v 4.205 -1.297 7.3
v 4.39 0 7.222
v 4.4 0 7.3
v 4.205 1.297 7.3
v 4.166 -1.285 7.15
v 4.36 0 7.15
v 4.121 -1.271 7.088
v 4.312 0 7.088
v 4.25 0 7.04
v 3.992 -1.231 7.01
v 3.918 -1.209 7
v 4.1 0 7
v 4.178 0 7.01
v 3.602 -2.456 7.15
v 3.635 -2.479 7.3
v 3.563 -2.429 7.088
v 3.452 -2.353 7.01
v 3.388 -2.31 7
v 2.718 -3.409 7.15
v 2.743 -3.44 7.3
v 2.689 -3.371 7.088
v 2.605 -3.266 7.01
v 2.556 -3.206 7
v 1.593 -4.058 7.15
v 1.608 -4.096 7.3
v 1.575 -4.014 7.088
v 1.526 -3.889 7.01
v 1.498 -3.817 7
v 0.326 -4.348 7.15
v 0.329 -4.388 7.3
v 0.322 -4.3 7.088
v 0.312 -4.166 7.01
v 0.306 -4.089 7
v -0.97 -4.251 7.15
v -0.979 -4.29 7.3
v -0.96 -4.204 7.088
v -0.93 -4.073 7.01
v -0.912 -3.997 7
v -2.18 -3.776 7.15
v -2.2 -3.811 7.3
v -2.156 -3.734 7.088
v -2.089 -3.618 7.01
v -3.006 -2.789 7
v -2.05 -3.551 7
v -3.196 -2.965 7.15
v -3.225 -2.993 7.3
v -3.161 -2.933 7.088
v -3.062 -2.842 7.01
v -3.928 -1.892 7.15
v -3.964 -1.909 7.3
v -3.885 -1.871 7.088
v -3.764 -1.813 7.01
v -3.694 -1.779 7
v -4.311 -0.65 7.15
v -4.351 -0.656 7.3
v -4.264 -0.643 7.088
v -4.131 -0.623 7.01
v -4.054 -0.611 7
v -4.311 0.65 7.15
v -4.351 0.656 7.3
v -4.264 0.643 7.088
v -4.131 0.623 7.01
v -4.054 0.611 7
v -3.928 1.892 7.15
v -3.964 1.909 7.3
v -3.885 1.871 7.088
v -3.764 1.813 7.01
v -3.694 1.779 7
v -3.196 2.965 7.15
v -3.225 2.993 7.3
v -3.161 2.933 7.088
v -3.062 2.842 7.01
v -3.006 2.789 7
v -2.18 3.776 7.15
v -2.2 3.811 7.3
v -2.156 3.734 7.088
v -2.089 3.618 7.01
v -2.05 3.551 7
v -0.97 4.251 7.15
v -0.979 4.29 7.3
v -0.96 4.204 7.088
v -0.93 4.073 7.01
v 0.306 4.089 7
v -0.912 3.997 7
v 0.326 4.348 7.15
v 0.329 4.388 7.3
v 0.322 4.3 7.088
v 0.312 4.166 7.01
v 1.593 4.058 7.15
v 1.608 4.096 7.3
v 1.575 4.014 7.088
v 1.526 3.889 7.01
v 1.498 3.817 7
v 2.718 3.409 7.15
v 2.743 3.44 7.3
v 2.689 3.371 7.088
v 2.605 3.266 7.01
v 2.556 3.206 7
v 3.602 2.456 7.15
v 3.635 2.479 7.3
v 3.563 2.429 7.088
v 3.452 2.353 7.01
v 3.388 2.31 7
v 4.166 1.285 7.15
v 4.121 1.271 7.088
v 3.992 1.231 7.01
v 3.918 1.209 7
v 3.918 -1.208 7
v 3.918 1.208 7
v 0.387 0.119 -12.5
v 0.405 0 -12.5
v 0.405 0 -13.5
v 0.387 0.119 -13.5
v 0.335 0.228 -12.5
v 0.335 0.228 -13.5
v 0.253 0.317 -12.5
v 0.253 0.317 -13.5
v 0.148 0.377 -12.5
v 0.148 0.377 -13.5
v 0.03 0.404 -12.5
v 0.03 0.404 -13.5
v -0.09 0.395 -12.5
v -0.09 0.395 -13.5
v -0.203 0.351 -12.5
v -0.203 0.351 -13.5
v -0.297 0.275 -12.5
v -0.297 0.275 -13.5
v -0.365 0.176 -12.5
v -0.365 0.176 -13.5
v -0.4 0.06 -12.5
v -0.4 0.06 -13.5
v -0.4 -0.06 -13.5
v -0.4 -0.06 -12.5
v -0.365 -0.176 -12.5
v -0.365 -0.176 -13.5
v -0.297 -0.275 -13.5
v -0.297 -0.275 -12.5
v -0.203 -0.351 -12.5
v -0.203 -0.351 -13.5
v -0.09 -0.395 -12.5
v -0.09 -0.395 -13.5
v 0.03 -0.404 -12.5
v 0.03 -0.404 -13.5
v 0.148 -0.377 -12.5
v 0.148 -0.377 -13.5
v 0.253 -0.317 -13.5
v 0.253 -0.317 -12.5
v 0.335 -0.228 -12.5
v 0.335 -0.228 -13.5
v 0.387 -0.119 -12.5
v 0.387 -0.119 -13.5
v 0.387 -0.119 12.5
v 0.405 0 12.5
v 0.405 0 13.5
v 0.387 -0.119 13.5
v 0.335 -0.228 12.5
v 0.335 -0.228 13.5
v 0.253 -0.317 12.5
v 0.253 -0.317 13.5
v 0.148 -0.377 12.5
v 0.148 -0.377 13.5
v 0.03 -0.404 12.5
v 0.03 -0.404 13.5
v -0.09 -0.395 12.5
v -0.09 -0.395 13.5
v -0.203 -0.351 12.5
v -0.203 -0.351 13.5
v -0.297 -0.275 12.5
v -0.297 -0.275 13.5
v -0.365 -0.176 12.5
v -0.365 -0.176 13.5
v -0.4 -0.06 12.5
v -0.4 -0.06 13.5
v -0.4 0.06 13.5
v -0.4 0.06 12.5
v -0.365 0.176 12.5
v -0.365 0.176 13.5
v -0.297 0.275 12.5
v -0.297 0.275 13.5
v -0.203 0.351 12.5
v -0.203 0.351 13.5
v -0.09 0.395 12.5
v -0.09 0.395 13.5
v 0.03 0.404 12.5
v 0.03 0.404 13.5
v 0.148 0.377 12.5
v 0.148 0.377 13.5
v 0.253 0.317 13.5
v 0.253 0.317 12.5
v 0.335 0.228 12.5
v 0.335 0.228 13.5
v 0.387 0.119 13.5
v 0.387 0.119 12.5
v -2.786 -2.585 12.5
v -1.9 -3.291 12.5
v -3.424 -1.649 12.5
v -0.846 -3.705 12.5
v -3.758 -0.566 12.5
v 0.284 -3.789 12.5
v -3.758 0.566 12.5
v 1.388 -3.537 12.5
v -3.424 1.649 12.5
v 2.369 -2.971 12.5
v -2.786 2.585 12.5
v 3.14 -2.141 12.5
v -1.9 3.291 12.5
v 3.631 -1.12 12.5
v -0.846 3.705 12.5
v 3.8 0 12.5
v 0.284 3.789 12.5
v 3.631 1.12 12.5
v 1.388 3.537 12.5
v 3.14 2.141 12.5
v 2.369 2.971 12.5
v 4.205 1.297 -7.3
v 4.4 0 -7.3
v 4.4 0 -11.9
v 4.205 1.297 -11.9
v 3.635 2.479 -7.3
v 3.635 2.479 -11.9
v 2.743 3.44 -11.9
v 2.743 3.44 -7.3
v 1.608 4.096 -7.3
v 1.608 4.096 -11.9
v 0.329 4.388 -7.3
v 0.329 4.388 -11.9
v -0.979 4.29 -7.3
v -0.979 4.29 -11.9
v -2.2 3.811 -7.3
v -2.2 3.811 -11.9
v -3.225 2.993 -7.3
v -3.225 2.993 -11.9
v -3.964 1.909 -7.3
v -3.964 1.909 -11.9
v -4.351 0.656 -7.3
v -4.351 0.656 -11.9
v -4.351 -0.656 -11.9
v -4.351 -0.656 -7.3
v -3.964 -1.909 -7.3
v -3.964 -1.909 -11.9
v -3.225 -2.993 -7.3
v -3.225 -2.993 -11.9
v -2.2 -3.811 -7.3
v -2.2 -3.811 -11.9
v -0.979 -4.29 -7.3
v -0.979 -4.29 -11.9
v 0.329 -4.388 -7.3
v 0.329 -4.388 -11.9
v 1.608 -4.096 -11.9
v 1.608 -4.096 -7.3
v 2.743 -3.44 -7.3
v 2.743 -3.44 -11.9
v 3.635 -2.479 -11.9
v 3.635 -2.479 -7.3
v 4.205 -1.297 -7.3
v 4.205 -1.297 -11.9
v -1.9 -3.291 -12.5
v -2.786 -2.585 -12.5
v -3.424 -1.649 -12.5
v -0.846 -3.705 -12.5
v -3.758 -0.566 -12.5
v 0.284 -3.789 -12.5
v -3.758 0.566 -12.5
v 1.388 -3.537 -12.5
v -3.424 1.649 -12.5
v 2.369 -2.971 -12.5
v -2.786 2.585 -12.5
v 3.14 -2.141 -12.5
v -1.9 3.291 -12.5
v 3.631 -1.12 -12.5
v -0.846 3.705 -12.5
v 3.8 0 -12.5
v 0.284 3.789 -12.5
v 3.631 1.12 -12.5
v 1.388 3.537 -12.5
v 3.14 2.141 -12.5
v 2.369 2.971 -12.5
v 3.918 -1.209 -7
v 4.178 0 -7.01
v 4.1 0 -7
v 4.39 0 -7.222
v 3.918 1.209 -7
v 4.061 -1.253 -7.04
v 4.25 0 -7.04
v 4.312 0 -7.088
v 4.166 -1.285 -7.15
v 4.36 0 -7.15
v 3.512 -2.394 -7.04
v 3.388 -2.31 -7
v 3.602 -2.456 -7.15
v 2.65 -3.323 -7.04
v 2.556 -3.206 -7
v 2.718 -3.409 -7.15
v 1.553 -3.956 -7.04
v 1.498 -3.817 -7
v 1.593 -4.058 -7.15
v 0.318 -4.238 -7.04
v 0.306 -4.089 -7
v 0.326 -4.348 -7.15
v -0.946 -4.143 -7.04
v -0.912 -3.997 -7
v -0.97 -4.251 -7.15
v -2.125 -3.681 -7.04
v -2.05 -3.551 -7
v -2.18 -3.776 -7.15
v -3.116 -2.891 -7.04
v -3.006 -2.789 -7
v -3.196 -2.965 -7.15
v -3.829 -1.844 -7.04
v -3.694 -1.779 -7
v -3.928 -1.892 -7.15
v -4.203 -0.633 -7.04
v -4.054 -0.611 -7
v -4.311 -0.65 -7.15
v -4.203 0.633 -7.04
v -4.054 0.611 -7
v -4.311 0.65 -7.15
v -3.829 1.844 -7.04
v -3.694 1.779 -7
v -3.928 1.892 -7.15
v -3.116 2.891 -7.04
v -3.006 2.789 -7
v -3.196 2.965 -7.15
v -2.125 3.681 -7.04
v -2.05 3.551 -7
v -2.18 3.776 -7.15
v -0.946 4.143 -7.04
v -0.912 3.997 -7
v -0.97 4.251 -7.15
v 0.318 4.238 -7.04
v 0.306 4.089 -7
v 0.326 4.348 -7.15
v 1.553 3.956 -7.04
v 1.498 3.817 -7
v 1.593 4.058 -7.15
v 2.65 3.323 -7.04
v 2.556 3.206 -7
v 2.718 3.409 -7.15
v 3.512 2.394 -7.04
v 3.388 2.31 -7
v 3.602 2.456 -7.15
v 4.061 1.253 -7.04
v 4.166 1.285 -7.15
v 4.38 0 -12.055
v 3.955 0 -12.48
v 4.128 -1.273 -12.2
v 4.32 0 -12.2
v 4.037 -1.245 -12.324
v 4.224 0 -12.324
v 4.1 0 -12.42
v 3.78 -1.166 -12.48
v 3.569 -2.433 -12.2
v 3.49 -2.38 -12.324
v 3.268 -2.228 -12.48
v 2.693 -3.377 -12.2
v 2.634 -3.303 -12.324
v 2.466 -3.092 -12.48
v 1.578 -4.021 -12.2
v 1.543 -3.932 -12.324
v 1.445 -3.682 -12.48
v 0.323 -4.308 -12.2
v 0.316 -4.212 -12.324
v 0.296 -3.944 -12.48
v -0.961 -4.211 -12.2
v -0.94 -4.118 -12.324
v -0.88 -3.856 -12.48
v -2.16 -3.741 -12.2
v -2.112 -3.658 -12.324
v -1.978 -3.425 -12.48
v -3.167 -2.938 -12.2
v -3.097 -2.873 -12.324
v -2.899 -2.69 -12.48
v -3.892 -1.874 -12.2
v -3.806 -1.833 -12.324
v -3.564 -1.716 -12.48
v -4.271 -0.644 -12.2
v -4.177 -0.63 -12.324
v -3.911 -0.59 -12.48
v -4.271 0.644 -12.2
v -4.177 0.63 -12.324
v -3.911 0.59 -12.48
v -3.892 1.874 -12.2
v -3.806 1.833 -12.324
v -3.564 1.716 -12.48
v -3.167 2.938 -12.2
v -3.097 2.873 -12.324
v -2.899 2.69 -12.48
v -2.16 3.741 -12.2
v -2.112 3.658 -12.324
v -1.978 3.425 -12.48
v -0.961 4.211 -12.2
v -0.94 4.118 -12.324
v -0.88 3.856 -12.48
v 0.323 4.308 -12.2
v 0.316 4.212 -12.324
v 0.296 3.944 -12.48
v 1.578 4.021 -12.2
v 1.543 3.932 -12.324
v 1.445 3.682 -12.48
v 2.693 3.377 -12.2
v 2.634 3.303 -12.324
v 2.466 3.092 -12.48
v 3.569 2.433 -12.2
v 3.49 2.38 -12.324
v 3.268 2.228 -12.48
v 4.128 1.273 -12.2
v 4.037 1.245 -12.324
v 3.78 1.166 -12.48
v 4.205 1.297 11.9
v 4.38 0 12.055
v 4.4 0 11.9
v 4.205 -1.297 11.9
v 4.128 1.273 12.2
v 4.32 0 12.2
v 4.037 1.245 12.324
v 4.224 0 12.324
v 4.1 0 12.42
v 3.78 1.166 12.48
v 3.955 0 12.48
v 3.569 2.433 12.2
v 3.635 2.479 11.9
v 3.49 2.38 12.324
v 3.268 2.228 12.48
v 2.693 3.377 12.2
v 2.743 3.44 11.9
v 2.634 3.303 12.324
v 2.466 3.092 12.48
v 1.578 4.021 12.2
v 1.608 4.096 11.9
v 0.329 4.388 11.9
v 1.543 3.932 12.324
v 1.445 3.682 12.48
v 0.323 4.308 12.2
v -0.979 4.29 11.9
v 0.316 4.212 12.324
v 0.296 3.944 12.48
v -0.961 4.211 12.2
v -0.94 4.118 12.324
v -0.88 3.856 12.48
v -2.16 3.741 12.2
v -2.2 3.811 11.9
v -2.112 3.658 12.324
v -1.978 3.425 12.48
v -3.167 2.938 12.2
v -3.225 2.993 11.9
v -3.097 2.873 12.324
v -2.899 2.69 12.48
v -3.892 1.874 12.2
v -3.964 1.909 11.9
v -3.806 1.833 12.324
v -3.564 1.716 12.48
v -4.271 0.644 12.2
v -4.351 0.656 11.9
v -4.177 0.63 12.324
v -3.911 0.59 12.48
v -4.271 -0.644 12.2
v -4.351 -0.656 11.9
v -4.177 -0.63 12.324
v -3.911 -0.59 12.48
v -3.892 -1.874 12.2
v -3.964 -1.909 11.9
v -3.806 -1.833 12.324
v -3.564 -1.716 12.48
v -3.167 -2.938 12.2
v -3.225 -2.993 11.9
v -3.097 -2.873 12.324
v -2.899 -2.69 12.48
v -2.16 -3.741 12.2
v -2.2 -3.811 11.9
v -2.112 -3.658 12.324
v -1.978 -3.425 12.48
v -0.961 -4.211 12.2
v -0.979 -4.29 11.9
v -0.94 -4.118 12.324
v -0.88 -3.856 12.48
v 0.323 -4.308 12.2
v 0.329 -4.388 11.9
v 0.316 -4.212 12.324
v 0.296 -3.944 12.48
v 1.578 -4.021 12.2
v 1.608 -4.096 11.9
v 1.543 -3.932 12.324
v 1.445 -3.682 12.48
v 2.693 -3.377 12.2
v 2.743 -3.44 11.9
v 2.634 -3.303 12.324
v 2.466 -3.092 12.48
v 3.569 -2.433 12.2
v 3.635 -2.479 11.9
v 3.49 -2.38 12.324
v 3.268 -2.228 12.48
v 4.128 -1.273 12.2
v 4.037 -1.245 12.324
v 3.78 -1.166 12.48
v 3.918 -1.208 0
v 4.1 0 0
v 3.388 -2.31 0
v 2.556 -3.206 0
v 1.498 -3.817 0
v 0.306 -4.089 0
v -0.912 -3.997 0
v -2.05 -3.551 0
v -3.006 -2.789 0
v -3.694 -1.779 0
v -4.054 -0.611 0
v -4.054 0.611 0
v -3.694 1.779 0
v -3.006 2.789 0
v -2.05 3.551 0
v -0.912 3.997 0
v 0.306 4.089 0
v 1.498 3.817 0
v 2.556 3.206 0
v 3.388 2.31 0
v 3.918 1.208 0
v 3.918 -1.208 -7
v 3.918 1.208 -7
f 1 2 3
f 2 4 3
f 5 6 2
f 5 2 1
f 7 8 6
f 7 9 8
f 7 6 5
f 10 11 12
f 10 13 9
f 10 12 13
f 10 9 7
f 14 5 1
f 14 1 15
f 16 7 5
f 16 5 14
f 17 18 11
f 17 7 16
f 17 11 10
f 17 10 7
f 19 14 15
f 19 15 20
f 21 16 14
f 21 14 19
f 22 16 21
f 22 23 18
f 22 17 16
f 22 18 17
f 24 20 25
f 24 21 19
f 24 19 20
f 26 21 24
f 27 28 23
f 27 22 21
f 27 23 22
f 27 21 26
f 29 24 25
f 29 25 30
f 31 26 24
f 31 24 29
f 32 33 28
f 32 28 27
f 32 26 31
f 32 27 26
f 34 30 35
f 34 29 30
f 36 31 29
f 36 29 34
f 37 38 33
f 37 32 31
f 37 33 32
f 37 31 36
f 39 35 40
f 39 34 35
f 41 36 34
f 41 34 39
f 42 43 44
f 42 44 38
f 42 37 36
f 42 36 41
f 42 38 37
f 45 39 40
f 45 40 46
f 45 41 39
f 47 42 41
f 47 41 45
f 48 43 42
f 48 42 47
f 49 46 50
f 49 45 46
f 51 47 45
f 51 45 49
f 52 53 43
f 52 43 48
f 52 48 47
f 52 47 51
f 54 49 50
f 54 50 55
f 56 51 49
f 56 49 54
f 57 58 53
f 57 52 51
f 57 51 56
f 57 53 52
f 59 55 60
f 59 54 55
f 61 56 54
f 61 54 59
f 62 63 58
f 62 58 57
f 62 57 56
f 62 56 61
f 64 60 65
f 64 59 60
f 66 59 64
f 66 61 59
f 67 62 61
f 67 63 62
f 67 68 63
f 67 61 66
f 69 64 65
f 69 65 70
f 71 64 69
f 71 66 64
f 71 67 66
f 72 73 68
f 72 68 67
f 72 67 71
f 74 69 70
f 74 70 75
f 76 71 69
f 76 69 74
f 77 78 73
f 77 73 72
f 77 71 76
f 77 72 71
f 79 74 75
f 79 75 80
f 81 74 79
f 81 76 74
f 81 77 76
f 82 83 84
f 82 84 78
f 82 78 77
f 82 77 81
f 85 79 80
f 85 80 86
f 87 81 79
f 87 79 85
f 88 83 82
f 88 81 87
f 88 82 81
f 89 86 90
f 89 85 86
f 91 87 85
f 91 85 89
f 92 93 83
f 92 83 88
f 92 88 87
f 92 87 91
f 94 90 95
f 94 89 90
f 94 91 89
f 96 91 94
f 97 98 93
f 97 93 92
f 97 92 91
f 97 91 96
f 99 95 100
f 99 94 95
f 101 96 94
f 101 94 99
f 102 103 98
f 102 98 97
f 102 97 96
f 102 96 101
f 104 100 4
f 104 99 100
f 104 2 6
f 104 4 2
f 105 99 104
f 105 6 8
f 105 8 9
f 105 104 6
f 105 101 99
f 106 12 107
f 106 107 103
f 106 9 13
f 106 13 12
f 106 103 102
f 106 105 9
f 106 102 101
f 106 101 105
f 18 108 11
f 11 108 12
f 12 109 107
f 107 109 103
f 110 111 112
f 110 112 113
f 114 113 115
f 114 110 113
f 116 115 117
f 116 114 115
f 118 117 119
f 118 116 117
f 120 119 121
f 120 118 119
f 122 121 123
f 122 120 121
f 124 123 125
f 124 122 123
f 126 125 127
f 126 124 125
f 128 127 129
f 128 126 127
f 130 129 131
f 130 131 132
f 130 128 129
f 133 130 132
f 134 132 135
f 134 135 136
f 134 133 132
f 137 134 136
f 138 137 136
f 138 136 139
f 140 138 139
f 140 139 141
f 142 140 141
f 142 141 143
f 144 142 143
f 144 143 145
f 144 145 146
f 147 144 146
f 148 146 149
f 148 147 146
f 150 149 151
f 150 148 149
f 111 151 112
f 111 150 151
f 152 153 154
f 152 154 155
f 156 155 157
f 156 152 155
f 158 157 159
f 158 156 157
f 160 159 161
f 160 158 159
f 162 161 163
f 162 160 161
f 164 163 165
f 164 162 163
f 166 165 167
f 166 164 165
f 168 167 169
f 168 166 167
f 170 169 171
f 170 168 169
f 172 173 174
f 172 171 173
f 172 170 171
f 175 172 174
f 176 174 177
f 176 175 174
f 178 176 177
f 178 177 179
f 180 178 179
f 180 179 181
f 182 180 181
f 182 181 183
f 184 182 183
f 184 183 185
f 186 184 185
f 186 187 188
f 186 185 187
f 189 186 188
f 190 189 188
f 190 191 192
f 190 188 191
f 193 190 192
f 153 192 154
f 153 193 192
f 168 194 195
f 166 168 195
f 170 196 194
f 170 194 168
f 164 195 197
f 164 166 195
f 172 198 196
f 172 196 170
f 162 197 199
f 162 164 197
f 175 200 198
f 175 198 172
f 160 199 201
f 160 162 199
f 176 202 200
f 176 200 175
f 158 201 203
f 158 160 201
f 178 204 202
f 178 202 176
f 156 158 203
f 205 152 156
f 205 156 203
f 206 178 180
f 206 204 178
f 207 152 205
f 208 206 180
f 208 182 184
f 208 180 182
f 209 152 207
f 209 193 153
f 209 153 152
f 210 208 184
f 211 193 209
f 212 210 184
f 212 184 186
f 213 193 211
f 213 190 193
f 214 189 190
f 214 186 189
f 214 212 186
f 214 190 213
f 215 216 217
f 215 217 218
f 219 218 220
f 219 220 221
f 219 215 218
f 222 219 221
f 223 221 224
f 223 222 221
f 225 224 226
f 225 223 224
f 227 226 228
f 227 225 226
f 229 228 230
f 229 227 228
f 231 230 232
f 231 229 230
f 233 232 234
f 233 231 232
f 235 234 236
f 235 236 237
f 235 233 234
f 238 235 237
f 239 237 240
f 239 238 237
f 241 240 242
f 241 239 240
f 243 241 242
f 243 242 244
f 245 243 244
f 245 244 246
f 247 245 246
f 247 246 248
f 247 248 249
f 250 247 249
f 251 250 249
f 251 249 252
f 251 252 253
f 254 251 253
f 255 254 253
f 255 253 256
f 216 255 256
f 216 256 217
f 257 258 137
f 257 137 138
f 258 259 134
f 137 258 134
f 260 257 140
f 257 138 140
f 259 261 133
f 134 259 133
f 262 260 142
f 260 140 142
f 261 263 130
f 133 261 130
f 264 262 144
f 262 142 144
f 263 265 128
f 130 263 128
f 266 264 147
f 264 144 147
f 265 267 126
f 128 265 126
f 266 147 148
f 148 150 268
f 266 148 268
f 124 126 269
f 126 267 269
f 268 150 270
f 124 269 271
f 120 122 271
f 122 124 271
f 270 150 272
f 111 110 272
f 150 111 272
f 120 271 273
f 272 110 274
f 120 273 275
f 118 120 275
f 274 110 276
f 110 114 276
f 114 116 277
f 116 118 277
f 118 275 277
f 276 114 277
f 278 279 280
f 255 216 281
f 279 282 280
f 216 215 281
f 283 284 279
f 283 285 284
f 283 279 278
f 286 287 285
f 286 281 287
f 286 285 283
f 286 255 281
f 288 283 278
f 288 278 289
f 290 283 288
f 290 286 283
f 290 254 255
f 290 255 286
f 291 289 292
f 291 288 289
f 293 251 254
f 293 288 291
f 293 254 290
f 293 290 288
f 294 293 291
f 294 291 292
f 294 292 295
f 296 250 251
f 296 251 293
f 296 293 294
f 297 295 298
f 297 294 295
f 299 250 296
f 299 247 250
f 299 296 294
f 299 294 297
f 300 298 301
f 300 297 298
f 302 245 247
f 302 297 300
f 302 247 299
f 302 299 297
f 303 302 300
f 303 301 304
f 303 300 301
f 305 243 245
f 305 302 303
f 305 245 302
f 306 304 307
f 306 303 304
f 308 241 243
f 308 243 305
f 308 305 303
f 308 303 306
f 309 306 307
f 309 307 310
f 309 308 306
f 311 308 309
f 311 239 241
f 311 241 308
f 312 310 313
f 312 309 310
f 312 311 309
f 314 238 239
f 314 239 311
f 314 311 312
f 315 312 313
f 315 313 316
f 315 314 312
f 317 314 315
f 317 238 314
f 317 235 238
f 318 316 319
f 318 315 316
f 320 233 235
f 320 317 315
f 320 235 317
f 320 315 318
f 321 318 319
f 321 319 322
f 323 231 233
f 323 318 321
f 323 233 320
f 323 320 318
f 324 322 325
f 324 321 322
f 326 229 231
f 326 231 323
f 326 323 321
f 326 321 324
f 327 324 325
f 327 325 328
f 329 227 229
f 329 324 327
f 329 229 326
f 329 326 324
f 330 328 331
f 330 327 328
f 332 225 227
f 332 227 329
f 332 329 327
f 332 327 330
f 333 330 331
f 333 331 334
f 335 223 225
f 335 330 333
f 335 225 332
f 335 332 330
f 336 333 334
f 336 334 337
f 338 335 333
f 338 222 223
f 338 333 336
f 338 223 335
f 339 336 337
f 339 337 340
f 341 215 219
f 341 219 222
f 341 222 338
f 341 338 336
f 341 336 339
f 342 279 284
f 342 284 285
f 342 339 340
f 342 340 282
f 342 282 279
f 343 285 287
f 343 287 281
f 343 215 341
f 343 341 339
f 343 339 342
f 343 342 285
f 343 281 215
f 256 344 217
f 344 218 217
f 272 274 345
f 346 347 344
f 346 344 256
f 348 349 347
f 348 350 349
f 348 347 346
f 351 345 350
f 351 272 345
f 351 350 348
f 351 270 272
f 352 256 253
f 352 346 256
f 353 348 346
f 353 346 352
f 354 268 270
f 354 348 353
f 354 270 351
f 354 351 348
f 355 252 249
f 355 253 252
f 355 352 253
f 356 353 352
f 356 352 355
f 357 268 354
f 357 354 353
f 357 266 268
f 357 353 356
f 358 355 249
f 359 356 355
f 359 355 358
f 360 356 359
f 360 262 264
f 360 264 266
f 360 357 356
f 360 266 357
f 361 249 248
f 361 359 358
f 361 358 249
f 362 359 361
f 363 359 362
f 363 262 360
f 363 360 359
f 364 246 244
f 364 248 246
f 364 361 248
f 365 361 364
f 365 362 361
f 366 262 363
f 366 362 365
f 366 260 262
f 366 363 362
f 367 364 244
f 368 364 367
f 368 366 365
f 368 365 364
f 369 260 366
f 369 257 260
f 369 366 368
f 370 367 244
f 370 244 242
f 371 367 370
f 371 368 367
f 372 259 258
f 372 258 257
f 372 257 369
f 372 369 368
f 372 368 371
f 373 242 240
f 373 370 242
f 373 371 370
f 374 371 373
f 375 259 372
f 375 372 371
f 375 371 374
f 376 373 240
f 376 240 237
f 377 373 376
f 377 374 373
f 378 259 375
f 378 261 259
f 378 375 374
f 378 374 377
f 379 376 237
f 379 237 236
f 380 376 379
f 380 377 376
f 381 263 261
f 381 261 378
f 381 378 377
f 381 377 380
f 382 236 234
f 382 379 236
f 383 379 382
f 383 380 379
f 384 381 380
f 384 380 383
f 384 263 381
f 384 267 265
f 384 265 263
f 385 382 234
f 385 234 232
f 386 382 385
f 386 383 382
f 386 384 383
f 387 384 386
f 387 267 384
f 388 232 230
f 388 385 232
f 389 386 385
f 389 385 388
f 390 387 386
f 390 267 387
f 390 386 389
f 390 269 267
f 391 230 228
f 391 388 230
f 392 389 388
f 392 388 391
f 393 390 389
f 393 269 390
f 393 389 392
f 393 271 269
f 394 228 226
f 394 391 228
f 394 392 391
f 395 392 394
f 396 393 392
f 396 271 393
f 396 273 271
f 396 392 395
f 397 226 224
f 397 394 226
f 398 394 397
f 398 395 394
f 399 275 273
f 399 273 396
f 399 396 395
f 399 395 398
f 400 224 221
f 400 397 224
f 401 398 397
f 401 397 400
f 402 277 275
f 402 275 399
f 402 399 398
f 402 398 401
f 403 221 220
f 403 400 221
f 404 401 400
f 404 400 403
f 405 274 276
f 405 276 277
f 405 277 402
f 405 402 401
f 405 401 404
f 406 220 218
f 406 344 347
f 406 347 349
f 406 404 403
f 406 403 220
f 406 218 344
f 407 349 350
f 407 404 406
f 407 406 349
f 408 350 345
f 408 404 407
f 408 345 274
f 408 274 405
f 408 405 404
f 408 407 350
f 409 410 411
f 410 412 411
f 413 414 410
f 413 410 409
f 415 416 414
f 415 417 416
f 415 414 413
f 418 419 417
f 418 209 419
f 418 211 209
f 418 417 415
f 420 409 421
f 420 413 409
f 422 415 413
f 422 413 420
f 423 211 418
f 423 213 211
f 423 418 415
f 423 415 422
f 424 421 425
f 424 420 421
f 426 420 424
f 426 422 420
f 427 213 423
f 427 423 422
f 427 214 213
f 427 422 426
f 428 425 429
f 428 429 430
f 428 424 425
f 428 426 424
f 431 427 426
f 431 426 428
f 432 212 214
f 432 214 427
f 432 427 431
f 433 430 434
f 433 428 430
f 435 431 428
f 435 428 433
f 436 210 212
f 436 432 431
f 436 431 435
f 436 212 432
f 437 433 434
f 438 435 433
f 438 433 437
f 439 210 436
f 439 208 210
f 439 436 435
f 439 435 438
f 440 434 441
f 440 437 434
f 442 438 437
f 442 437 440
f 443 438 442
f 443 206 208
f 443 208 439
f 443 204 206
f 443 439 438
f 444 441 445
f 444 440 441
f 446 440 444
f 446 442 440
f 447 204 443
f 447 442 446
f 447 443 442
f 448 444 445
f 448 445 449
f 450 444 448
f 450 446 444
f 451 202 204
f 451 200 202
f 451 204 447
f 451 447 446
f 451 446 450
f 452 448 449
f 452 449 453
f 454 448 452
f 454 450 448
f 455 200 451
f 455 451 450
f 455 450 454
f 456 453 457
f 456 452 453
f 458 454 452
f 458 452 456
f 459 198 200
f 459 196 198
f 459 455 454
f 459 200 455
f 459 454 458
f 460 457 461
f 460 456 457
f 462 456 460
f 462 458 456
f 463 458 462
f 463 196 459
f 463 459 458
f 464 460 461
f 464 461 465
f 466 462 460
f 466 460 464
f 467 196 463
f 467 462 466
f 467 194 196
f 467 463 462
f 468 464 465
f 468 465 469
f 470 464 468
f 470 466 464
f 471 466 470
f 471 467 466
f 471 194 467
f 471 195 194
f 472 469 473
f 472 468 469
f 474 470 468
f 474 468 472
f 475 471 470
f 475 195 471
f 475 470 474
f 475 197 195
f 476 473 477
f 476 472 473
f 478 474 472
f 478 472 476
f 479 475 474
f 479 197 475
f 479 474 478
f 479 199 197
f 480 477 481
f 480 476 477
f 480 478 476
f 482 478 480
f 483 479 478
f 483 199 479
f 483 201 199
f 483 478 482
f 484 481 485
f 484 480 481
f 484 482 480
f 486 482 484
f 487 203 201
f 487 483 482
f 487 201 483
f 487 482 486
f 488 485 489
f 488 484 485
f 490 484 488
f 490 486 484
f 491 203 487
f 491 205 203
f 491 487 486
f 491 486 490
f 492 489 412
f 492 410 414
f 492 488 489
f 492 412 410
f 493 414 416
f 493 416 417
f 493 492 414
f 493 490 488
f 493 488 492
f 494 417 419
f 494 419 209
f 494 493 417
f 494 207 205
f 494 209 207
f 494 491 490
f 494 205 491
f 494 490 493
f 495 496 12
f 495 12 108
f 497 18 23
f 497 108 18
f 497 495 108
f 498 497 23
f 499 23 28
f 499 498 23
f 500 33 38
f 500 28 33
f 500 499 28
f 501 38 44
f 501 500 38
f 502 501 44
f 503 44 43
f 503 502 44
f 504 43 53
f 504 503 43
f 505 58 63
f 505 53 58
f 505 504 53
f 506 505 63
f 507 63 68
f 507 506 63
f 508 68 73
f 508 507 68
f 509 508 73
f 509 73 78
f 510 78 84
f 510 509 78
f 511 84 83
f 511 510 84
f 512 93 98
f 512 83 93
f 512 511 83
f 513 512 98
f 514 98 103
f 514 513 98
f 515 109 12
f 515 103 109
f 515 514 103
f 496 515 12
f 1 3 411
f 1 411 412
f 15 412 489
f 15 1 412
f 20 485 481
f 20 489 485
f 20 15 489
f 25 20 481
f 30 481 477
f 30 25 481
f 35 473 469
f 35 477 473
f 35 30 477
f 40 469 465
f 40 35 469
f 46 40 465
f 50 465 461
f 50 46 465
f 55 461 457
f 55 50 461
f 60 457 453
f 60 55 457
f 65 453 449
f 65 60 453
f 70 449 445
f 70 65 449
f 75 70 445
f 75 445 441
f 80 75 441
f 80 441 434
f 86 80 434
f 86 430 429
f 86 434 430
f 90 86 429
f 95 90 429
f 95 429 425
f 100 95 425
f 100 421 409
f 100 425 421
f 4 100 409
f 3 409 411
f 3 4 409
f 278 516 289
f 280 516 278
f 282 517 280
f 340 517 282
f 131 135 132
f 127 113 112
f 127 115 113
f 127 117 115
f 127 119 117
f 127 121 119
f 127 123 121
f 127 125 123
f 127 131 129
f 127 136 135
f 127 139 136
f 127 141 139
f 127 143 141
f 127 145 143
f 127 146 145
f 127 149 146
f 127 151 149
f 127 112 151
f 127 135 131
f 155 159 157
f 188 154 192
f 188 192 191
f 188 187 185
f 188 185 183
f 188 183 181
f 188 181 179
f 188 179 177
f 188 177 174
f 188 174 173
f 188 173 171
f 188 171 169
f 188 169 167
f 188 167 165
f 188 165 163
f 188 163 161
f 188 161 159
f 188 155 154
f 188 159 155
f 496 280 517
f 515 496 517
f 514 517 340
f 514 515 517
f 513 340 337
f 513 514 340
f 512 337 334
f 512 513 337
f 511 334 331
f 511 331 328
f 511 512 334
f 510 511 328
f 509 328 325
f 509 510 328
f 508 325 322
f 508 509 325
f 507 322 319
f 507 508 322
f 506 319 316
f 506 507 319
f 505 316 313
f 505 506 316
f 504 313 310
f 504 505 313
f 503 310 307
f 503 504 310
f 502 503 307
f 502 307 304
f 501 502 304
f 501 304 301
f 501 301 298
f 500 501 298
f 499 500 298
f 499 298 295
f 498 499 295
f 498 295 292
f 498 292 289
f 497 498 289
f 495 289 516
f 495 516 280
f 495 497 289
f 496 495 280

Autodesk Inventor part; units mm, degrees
ref_plane "YZ Plane" through (0, 0, 0) normal (1, 0, 0) x (0, 1, 0)
ref_plane "XZ Plane" through (0, 0, 0) normal (0, 1, 0) x (-1, 0, 0)
ref_plane "XY Plane" through (0, 0, 0) normal (0, 0, 1) x (1, 0, 0)
sketch "Skizze1" plane through (0, 0, 0) normal (0, 0, 1) x (1, 0, 0)
  circle A0 centre (0, 0) radius 4.4
  dimension "d0" = 8.8
extrude "Extrusion1" add sketch "Skizze1" along normal mid plane 25
sketch "Skizze4" plane through (0, 0, 0) normal (0, 0, 1) x (1, 0, 0)
  circle A0 centre (0, 0) radius 4.4 projected
  circle A1 centre (0, 0) radius 4.1
  dimension "d10" = 0.3
extrude "Extrusion4" cut sketch "Skizze4" along normal mid plane 14
fillet "Rundung1" radius 0.3 2 edges at (-4.4, 0, 7) (-4.4, 0, -7)
fillet "Rundung2" radius 0.6 2 edges at (-4.4, 0, 12.5) (-4.4, 0, -12.5)
sketch "Skizze6" plane through (0, 0, 12.5) normal (0, 0, 1) x (1, 0, 0)
  circle A0 centre (0, 0) radius 0.405
  dimension "d21" = 0.81
extrude "Extrusion6" add sketch "Skizze6" along normal blind 1
mirror "Spiegeln3" about plane through (0, 0, 0) normal (0, 0, 1) of "Extrusion6"
properties part number "resistor WHS7 68R" material "Gummi, Silikon"
